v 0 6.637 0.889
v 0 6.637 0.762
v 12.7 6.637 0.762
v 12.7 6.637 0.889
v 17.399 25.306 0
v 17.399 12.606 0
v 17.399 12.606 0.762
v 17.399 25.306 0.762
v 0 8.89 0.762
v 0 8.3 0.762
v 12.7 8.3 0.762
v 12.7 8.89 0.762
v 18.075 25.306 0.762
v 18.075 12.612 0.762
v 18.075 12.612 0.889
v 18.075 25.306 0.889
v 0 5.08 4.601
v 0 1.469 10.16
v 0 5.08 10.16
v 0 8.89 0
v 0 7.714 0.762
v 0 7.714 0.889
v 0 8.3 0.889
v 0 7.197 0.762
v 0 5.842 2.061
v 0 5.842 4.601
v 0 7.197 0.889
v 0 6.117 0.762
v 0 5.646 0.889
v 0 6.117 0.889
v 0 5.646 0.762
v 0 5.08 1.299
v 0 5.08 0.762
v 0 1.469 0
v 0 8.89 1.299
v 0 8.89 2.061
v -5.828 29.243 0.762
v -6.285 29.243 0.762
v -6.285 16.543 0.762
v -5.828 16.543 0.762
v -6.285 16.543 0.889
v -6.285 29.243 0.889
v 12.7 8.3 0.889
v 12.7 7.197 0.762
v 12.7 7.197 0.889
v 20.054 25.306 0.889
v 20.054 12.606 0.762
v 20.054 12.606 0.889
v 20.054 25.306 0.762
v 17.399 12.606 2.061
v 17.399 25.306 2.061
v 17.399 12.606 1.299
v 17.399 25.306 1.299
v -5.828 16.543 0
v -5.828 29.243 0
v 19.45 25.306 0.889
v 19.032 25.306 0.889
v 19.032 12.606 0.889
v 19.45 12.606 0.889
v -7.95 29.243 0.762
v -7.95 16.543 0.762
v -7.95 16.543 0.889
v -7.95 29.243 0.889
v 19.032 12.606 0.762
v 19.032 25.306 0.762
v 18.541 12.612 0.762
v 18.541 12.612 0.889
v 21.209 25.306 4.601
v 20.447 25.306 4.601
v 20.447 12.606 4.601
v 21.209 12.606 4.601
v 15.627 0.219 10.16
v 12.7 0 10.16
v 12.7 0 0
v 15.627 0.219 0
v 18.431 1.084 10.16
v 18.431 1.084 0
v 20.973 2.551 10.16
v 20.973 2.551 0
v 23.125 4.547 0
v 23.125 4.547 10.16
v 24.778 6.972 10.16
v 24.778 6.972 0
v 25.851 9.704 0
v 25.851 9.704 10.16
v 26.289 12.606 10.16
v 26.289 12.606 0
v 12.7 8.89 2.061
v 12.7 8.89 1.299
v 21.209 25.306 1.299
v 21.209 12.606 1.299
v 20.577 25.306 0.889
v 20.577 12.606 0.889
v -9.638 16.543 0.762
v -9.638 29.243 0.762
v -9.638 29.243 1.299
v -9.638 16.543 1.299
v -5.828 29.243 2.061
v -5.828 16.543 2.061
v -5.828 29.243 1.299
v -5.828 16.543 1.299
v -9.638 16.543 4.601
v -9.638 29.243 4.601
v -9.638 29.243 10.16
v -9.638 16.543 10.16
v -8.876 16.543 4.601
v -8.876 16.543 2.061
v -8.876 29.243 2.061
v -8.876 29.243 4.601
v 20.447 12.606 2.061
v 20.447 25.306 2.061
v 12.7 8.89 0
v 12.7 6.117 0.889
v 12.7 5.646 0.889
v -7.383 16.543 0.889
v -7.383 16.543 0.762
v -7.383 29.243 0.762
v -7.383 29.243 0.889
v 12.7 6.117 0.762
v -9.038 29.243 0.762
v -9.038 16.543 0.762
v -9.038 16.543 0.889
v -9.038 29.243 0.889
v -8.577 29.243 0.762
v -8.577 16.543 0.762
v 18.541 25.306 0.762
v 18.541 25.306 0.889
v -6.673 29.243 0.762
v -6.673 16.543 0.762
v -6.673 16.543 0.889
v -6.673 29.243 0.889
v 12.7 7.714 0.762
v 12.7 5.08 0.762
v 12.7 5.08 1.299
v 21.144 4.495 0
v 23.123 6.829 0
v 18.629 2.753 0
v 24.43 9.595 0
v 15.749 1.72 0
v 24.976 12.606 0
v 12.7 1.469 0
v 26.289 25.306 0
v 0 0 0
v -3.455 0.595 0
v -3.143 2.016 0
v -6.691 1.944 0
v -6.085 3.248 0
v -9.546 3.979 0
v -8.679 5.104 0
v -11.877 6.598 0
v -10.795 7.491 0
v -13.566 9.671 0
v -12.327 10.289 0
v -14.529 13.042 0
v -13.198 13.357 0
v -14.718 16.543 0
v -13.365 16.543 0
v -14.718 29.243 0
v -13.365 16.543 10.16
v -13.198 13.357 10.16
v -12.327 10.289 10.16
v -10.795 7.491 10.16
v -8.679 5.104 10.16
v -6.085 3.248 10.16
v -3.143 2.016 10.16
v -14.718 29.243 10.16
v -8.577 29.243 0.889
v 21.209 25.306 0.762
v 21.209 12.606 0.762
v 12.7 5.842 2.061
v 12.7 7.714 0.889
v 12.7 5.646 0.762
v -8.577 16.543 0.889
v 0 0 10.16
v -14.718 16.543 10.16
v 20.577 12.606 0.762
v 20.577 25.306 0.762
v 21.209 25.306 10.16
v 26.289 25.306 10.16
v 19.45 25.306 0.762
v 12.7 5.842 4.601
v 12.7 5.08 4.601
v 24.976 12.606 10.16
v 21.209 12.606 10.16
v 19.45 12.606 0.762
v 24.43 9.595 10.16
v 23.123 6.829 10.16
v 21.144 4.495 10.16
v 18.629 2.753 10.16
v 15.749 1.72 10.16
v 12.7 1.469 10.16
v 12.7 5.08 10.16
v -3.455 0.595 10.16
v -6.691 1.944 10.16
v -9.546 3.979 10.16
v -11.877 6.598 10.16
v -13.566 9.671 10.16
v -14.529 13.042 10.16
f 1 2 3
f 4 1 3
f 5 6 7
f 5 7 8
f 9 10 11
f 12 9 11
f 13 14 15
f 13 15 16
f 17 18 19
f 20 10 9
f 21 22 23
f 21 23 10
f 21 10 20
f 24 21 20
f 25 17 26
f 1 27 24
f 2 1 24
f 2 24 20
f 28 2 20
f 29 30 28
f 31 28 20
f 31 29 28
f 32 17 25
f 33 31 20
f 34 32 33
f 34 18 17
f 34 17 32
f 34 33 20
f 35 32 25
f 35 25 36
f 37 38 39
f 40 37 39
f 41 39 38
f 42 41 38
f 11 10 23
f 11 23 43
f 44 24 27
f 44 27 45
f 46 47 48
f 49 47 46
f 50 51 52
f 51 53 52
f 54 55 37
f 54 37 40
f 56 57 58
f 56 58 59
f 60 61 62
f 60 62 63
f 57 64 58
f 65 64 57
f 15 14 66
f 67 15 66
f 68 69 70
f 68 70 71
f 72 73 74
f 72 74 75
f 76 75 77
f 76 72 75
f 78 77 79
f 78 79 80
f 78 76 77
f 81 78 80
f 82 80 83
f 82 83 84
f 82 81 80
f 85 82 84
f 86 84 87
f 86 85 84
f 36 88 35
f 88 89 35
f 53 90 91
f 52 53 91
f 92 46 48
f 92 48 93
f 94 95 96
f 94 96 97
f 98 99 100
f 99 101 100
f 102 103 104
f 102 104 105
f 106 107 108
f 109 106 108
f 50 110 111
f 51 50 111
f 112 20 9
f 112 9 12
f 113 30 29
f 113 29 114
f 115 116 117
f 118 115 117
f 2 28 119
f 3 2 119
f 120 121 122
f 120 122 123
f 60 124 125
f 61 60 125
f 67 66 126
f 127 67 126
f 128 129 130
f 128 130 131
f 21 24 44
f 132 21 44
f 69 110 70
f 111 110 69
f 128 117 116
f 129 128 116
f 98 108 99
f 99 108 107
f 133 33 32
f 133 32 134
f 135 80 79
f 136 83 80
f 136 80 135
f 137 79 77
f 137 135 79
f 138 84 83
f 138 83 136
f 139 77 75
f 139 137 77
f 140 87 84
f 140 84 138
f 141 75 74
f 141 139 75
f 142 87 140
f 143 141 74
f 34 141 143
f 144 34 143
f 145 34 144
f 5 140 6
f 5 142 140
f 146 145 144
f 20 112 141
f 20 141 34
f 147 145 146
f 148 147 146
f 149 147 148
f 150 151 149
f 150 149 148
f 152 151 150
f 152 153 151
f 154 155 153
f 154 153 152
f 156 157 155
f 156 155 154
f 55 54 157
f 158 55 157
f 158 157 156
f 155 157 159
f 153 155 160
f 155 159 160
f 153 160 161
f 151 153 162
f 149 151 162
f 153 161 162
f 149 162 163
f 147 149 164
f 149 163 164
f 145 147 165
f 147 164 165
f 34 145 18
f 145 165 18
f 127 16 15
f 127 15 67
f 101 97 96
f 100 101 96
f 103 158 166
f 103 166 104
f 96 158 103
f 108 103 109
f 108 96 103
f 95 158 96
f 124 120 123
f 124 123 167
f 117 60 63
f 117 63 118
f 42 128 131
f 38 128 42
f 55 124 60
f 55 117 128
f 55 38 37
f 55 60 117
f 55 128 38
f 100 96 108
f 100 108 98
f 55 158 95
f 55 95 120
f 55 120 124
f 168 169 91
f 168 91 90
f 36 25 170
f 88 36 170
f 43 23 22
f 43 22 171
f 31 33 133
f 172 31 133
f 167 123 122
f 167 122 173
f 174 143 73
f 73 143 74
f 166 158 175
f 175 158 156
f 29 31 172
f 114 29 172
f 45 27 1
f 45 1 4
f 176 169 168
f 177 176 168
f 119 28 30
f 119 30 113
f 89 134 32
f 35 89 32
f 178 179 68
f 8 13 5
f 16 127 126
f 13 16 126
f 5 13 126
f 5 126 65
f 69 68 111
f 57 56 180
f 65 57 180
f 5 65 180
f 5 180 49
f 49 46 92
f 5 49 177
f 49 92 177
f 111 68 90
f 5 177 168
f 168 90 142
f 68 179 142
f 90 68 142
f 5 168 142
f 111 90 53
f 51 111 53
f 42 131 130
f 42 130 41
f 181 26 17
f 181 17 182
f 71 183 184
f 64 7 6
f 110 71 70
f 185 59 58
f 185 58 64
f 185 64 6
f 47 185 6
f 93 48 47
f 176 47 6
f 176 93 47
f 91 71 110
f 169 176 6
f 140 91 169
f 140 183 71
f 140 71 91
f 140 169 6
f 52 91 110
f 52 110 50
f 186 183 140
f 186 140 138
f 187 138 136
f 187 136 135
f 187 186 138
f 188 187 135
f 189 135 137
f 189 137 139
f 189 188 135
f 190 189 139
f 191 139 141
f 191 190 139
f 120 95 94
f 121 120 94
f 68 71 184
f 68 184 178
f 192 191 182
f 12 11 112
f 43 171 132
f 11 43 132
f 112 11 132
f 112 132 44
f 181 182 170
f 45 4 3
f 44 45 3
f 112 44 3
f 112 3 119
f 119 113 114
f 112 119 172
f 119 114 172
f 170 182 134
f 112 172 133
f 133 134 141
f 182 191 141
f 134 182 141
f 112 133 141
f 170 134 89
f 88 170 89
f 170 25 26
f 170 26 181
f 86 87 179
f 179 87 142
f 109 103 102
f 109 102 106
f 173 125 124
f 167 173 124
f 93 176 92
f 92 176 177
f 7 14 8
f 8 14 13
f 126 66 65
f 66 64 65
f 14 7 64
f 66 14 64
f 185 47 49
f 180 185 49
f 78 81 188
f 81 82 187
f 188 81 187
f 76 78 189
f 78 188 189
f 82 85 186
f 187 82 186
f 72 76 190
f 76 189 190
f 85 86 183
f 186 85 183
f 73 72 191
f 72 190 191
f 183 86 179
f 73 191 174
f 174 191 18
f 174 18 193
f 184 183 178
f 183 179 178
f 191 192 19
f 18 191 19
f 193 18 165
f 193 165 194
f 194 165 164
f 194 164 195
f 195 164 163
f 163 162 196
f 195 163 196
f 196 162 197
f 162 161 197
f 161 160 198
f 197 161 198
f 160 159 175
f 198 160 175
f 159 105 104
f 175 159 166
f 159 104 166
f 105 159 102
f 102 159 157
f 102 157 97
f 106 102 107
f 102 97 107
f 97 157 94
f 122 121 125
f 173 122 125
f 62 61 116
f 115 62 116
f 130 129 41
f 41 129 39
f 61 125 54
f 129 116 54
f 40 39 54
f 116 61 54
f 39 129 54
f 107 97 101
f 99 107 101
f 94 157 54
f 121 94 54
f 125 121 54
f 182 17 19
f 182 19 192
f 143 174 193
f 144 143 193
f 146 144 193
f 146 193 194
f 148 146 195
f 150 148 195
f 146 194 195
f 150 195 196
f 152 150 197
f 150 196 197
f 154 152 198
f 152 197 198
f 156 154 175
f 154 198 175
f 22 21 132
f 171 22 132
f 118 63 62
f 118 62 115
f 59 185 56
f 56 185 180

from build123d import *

# Parameters (mm, degrees)
SKETCH1_W             = 12.7
SKETCH1_H             = 5.08
BOSS_EXTRUDE1_DEPTH   = 10.16
SKETCH2_W             = 12.7
SKETCH2_H             = 0.762
BOSS_EXTRUDE3_DEPTH   = 3.81
BOSS_EXTRUDE4_DEPTH   = 3.81
BODY_MOVE_COPY3_ANGLE = 90
BODY_MOVE_COPY6_ANGLE = 180
BOSS_EXTRUDE6_DEPTH   = 10.16
SKETCH17_W            = 12.7
SKETCH17_H            = 0.586972929
SKETCH17_H_2          = 0.560182851
SKETCH17_H_3          = 0.470375136
SKETCH17_W_2          = 0.38891101
SKETCH17_H_4          = 12.7
SKETCH17_W_3          = 0.566388334
SKETCH17_W_4          = 0.460759313
SKETCH17_W_5          = 0.522714126
SKETCH17_W_6          = 0.418299814
SKETCH17_W_7          = 0.466316337
SKETCH17_H_5          = 12.693652269
BOSS_EXTRUDE10_DEPTH  = 0.127
SKETCH18_W            = 0.762
SKETCH18_H            = 12.7
SKETCH18_W_2          = 12.7
SKETCH18_H_2          = 0.762
BOSS_EXTRUDE11_DEPTH  = 2.54


with BuildPart() as part:
    # Sketch1 → Boss-Extrude1 (new body)
    with BuildSketch(Plane.XY):
        with Locations((6.35, 2.54)):
            Rectangle(SKETCH1_W, SKETCH1_H)
    extrude(amount=BOSS_EXTRUDE1_DEPTH)

    # Sketch2 → Boss-Extrude3 (add)
    with BuildSketch(Plane(origin=(0, 5.08, 0), x_dir=(1, 0, 0), z_dir=(0, 1, 0))):
        with Locations((6.35, -0.381)):
            Rectangle(SKETCH2_W, SKETCH2_H)
    extrude(amount=BOSS_EXTRUDE3_DEPTH)

    # Sketch4 → Boss-Extrude4 (add)
    with BuildSketch(Plane(origin=(0, 5.08, 0), x_dir=(1, 0, 0), z_dir=(0, 1, 0))):
        Polygon((1.196042578, -2.061016669), (0, -2.061016669), (0, -1.299016669), (1.196042578, -1.299016669), (12.7, -1.299016669), (12.7, -2.061016669), align=None)
    extrude(amount=BOSS_EXTRUDE4_DEPTH)


with BuildPart() as body_2:
    # Body-Move/Copy1: copy of part
    add(part.part.moved(Location((-19.746027861, 19.169390197, 0))))


with BuildPart() as body_2_1:
    # Body-Move/Copy3: moved
    add(body_2.part.rotate(Axis((-13.396027861, 25.765927537, 0), (0, 0, -1)), BODY_MOVE_COPY3_ANGLE))


with BuildPart() as body_3:
    # Body-Move/Copy5: copy of body 2
    add(body_2_1.part.moved(Location((40.507721278, -2.230163532, 0))))


with BuildPart() as body_3_1:
    # Body-Move/Copy6: moved
    add(body_3.part.rotate(Axis((27.111693417, 25.765927537, 0), (0, 0, 1)), BODY_MOVE_COPY6_ANGLE))


with BuildPart() as body_3_2:
    # Body-Move/Copy7: moved
    add(body_3_1.part.moved(Location((-7.419705442, -9.040319303, 0))))


with BuildPart() as body_2_2:
    # Body-Move/Copy8: moved
    add(body_2_1.part.moved(Location((5.274716885, -2.873342861, 0))))


with BuildPart() as part_1:
    add(part.part)

    add(body_2_2.part)  # Boss-Extrude6 merges body 2

    add(body_3_2.part)  # Boss-Extrude6 merges body 3
    # Sketch12 → Boss-Extrude6 (add)
    with BuildSketch(Plane.XY.offset(10.16)):
        with BuildLine():
            Line((-14.717848316, 16.542584676), (-13.364641255, 16.542584676))
            ThreePointArc((-13.364641255, 16.542584676), (-9.804171486, 6.237862161), (0, 1.46895531))
            Line((0, 1.46895531), (0, 0))
            ThreePointArc((0, 0), (-10.785005623, 5.223126147), (-14.717848316, 16.542584676))
        make_face()
        with BuildLine():
            Line((12.7, 1.46895531), (12.7, 0))
            ThreePointArc((12.7, 0), (22.105003473, 3.488610144), (26.288525315, 12.605771766))
            Line((26.288525315, 12.605771766), (24.975782085, 12.605771766))
            ThreePointArc((24.975782085, 12.605771766), (21.144401251, 4.494965824), (12.7, 1.46895531))
        make_face()
    extrude(amount=-BOSS_EXTRUDE6_DEPTH)

    # Sketch17 → Boss-Extrude10 (add)
    with BuildSketch(Plane.XY.offset(0.762)):
        with Locations((6.35, 8.007004569)):
            Rectangle(SKETCH17_W, SKETCH17_H)
        with Locations((6.35, 6.9171208)):
            Rectangle(SKETCH17_W, SKETCH17_H_2)
        with Locations((6.35, 5.881481875)):
            Rectangle(SKETCH17_W, SKETCH17_H_3)
        with Locations((-6.478997016, 22.892584676)):
            Rectangle(SKETCH17_W_2, SKETCH17_H_4)
        with Locations((-7.666574601, 22.892584676)):
            Rectangle(SKETCH17_W_3, SKETCH17_H_4)
        with Locations((-8.807561086, 22.892584676)):
            Rectangle(SKETCH17_W_4, SKETCH17_H_4)
        with Locations((20.31529367, 18.955771766)):
            Rectangle(SKETCH17_W_5, SKETCH17_H_4)
        with Locations((19.241203682, 18.955771766)):
            Rectangle(SKETCH17_W_6, SKETCH17_H_4)
        with Locations((18.30794503, 18.958945632)):
            Rectangle(SKETCH17_W_7, SKETCH17_H_5)
    extrude(amount=BOSS_EXTRUDE10_DEPTH)

    # Sketch18 → Boss-Extrude11 (add)
    with BuildSketch(Plane.XY.offset(2.061016669)):
        with Locations((-9.256848316, 22.892584676)):
            Rectangle(SKETCH18_W, SKETCH18_H)
        with Locations((6.35, 5.461)):
            Rectangle(SKETCH18_W_2, SKETCH18_H_2)
        with Locations((20.827525315, 18.955771766)):
            Rectangle(SKETCH18_W, SKETCH18_H)
    extrude(amount=BOSS_EXTRUDE11_DEPTH)


solid = part_1.part
